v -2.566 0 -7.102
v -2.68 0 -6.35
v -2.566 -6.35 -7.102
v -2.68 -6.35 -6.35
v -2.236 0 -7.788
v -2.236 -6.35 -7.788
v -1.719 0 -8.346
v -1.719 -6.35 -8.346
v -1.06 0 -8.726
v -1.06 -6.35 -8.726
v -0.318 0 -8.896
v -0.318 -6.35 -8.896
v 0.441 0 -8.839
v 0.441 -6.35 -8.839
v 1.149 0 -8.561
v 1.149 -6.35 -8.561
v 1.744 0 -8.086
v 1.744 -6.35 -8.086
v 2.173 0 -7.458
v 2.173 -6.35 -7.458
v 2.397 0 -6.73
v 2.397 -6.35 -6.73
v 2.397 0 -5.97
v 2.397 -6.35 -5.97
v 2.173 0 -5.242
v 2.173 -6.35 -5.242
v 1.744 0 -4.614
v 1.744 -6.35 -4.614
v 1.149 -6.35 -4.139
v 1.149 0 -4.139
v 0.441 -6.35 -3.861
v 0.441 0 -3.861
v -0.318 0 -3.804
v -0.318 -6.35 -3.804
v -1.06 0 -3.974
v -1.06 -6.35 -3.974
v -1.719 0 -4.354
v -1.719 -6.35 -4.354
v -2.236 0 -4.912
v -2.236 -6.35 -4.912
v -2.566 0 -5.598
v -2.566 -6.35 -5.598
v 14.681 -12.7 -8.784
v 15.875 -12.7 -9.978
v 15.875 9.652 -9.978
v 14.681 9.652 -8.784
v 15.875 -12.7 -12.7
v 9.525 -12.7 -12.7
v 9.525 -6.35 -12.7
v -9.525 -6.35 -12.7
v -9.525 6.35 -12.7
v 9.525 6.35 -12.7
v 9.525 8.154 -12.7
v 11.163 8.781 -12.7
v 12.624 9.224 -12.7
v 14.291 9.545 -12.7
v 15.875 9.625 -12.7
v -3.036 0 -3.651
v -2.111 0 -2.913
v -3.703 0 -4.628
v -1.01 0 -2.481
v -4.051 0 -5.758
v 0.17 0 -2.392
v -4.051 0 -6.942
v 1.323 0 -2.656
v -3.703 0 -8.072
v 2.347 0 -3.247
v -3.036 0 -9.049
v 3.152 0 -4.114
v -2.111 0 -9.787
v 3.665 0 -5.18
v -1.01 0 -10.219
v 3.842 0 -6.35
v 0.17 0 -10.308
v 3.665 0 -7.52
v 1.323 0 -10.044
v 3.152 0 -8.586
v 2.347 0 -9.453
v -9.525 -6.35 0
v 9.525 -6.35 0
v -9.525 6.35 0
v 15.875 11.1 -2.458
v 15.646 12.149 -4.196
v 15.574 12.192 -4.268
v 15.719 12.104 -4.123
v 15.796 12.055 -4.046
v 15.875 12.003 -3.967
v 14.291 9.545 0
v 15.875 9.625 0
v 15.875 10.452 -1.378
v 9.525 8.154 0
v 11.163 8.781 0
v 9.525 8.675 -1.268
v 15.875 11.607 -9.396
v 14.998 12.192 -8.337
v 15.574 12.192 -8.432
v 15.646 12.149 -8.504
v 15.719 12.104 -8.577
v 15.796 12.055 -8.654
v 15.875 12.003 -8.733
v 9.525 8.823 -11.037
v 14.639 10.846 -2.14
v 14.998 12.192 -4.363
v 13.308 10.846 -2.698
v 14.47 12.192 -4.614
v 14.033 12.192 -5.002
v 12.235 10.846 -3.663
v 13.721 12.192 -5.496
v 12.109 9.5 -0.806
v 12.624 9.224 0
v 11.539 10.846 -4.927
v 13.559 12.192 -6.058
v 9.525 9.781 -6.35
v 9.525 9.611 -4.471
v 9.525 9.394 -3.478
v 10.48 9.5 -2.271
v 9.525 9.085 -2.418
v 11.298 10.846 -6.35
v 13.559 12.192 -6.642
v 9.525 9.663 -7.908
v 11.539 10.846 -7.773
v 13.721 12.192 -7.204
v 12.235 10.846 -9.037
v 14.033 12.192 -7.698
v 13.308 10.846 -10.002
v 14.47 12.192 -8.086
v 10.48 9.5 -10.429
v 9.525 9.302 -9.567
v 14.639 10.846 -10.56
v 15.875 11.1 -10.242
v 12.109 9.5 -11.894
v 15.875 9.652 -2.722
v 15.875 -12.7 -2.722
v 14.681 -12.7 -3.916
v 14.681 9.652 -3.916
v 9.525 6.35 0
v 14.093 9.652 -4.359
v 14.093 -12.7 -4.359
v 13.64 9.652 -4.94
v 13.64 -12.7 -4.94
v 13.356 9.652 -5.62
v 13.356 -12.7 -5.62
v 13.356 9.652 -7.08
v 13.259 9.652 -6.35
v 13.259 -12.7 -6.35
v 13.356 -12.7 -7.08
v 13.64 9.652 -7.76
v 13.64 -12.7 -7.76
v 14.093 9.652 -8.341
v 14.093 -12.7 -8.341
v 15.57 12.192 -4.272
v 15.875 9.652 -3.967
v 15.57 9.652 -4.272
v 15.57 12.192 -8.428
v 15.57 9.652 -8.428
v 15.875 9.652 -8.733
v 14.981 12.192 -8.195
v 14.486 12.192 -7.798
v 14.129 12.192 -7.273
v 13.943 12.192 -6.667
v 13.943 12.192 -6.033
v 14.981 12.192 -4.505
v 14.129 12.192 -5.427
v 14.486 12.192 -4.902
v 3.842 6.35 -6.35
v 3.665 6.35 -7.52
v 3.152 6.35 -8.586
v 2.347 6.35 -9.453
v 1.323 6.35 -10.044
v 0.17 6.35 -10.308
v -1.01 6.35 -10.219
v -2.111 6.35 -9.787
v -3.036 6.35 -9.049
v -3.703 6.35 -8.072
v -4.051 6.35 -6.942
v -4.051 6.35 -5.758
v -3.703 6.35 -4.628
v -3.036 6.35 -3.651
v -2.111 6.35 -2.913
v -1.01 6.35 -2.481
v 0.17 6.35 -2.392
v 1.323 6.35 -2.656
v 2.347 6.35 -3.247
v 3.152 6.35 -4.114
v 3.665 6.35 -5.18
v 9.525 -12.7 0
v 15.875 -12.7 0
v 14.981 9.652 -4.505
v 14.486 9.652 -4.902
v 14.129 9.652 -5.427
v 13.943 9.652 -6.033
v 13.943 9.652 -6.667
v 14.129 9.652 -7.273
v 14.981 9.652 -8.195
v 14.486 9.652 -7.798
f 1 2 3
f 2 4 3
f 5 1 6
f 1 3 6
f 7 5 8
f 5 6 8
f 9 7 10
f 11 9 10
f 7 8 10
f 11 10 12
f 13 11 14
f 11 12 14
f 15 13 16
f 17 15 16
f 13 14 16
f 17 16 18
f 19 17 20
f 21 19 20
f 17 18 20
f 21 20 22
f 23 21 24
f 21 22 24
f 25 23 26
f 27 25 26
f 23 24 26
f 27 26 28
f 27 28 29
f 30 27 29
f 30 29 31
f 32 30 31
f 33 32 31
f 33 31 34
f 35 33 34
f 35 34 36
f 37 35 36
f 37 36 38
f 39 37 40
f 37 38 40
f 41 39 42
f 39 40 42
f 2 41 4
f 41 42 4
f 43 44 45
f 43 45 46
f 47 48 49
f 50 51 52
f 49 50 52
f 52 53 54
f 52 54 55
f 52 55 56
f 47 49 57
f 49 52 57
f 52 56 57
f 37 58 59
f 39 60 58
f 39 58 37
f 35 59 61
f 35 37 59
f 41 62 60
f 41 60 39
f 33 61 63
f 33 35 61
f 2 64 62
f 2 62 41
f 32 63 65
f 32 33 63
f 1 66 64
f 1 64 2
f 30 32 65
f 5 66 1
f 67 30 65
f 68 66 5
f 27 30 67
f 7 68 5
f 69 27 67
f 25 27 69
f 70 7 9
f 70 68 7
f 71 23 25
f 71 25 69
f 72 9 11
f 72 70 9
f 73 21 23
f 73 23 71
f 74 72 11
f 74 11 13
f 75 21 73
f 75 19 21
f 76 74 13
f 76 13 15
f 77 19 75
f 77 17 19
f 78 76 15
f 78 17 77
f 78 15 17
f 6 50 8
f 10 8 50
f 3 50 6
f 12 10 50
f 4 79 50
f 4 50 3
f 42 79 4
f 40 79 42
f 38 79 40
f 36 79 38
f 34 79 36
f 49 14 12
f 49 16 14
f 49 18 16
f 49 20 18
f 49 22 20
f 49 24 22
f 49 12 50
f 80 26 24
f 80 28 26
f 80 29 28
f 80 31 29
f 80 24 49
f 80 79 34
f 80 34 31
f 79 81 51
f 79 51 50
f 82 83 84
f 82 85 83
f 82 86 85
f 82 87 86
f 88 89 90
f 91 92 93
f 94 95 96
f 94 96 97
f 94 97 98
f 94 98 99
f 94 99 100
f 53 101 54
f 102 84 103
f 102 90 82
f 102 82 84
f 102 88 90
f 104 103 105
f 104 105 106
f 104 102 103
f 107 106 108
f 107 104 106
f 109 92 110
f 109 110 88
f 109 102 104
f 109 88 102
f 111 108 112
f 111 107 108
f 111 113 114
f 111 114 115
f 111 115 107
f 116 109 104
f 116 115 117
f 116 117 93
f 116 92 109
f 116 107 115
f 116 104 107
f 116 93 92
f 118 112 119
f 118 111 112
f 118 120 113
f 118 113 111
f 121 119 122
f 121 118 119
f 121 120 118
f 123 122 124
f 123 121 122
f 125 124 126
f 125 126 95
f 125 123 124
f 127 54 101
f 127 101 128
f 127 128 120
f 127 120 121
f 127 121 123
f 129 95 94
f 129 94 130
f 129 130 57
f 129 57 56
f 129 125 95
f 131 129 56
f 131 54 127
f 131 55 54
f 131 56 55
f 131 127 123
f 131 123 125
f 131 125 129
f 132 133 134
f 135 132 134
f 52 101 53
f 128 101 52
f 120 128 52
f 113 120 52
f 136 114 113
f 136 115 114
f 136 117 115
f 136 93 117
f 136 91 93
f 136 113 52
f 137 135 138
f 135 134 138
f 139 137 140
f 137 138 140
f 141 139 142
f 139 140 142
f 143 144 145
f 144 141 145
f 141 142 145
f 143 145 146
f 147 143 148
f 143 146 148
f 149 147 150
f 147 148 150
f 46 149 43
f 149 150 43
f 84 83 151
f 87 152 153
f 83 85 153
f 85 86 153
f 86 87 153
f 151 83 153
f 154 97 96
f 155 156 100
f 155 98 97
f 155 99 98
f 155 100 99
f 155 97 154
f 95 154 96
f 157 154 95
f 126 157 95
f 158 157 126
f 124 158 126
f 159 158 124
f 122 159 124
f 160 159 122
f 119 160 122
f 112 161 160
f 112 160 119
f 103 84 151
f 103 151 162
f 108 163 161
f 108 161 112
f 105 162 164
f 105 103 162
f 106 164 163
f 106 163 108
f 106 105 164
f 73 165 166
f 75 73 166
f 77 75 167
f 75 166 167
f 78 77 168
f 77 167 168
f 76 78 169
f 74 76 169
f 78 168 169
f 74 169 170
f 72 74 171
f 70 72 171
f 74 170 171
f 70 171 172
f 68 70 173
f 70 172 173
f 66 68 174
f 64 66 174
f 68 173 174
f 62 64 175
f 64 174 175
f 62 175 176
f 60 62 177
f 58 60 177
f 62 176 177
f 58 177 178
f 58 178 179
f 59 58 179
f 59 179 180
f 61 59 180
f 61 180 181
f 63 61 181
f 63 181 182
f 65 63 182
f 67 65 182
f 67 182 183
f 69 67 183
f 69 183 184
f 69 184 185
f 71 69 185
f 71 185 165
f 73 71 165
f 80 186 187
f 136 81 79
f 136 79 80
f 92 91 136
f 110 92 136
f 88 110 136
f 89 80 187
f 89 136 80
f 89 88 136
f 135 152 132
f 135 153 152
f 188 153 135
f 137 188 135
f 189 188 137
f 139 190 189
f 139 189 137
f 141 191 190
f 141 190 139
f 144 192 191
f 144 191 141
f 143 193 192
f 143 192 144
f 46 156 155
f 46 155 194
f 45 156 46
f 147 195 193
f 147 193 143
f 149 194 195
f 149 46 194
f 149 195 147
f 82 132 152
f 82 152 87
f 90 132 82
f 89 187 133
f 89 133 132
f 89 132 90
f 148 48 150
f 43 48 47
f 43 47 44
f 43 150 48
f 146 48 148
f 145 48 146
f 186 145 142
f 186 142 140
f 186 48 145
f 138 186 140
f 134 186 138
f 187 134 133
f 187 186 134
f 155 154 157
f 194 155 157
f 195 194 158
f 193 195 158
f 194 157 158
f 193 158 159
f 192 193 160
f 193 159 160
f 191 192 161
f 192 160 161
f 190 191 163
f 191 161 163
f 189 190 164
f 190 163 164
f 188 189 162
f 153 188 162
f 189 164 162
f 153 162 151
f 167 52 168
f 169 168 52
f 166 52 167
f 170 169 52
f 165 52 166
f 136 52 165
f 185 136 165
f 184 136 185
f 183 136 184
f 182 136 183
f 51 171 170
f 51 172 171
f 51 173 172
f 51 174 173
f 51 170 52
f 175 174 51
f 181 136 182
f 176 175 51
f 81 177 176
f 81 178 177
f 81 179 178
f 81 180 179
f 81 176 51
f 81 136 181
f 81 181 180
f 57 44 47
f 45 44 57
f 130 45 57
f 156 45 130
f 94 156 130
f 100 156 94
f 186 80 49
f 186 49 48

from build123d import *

# Parameters (mm, degrees)
SALIENTE_EXTRUIR1_DEPTH                              = 12.7
REFRENTADO_PARA_TORNILLO_CON_CABEZA_HUEC_D           = 5.1054
REFRENTADO_PARA_TORNILLO_CON_CABEZA_HUEC_CBORE_D     = 7.9375
REFRENTADO_PARA_TORNILLO_CON_CABEZA_HUEC_CBORE_DEPTH = 6.35
REFRENTADO_PARA_TORNILLO_CON_CABEZA_2_D              = 4.2672
REFRENTADO_PARA_TORNILLO_CON_CABEZA_2_CBORE_D        = 5.588
REFRENTADO_PARA_TORNILLO_CON_CABEZA_2_CBORE_DEPTH    = 22.352
CORTAR_EXTRUIR4_DEPTH                                = 22.352
CORTAR_EXTRUIR5_DEPTH                                = 33.139030617
CORTAR_EXTRUIR2_DEPTH                                = 6.35


with BuildPart() as part:
    # Croquis1 → Saliente-Extruir1 (new body)
    with BuildSketch(Plane.XY):
        Polygon((-9.525, 6.35), (-9.525, -6.35), (9.525, -6.35), (9.525, -12.7), (15.875, -12.7), (15.875, 12.192), (9.525, 12.192), (9.525, 6.35), align=None)
    extrude(amount=-SALIENTE_EXTRUIR1_DEPTH)

    # Refrentado para tornillo con cabeza huec (through all)
    with Locations(Plane(origin=(0, 6.35, 0), x_dir=(1, 0, 0), z_dir=(0, 1, 0))):
        with Locations((-0.127, 6.35)):
            CounterBoreHole(REFRENTADO_PARA_TORNILLO_CON_CABEZA_HUEC_D / 2, REFRENTADO_PARA_TORNILLO_CON_CABEZA_HUEC_CBORE_D / 2, REFRENTADO_PARA_TORNILLO_CON_CABEZA_HUEC_CBORE_DEPTH)

    # Refrentado para tornillo con cabeza  2 (through all)
    with Locations(Plane(origin=(0, -12.7, 0), x_dir=(-1, 0, 0), z_dir=(0, -1, 0))):
        with Locations((-16.0528, 6.35)):
            CounterBoreHole(REFRENTADO_PARA_TORNILLO_CON_CABEZA_2_D / 2, REFRENTADO_PARA_TORNILLO_CON_CABEZA_2_CBORE_D / 2, REFRENTADO_PARA_TORNILLO_CON_CABEZA_2_CBORE_DEPTH)

    # Croquis12 → Cortar-Extruir4 (cut)
    with BuildSketch(Plane.XZ.offset(12.7)):
        Polygon((15.875, -9.977962986), (14.6812, -8.784162986), (15.875, -8.784162986), align=None)
        Polygon((15.875, -3.915837014), (15.875, -2.722037014), (14.6812, -3.915837014), align=None)
    extrude(amount=-CORTAR_EXTRUIR4_DEPTH, mode=Mode.SUBTRACT)

    # Croquis13 → Cortar-Extruir5 (cut, through all)
    with BuildSketch(Plane.XZ.offset(12.7)):
        Polygon((15.875, -3.966896317), (15.5702, -4.271696317), (15.875, -4.271696317), align=None)
        Polygon((15.875, -8.428303683), (15.875, -8.733103683), (15.5702, -8.428303683), align=None)
    extrude(amount=-CORTAR_EXTRUIR5_DEPTH, mode=Mode.SUBTRACT)

    # Croquis21 → Cortar-Revolución12 (revolve, cut)
    with BuildSketch(Plane.XY.offset(-6.35)):
        Polygon((13.5382, 12.192), (5.6007, 7.422668836), (5.6007, 12.192), align=None)
    revolve(axis=Axis((15.621, 12.192, -6.35), (0, -1, 0)), mode=Mode.SUBTRACT)

    # Croquis5 → Cortar-Extruir2 (cut)
    with BuildSketch(Plane(origin=(15.875, 0, 0), x_dir=(0, 0, -1), z_dir=(1, 0, 0))):
        Polygon((8.472730115, 12.192), (12.7, 9.652), (12.7, 12.192), align=None)
        Polygon((4.227269885, 12.192), (0, 9.652), (0, 12.192), align=None)
    extrude(amount=-CORTAR_EXTRUIR2_DEPTH, mode=Mode.SUBTRACT)


solid = part.part
